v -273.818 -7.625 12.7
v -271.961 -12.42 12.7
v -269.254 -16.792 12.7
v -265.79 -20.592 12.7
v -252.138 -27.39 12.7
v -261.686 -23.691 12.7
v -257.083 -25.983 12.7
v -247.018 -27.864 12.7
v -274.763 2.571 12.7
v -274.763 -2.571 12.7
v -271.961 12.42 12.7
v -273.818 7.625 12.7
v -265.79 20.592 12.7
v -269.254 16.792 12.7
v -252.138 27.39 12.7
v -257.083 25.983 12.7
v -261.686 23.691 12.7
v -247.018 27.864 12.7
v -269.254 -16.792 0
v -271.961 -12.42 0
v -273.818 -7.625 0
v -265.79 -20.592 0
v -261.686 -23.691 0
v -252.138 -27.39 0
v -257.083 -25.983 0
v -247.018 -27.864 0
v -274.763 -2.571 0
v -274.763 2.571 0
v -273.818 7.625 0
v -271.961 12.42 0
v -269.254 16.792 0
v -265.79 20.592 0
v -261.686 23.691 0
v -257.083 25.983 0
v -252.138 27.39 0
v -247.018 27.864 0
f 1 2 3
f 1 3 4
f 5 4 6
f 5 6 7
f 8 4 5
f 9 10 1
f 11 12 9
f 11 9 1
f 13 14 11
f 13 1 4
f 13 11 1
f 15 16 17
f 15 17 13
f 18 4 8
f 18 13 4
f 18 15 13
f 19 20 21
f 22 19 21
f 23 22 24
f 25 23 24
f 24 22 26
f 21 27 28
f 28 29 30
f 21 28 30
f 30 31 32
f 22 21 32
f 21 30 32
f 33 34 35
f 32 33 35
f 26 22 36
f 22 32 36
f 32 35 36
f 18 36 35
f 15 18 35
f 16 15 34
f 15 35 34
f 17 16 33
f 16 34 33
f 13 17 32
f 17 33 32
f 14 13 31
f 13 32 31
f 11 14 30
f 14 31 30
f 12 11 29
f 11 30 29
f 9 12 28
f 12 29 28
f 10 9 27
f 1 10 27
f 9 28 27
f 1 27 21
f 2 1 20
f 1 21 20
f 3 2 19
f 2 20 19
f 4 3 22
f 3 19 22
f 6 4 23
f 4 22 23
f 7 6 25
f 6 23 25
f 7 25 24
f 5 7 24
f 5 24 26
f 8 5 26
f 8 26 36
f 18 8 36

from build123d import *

# Parameters (mm, degrees)
F4_DEPTH = 12.7
F5_R     = 6.1731972722
F6_DEPTH = 12.7
F7_DEPTH = 12.7


# Not quite as in the source:
# - a feature of the source that left no trace in its solid (it failed there, or was rolled back) is left out


with BuildPart() as f4:
    # F3 (on Top) → F4 (new body)
    with BuildSketch(Plane.XY):
        with BuildLine():
            Line((-247.0177412033, 0), (-247.0177412033, 27.8642479823))
            ThreePointArc((-247.0177412033, 27.8642479823), (-274.8819891856, 0), (-247.0177412033, -27.8642479823))
            Line((-247.0177412033, -27.8642479823), (-247.0177412033, 0))
        make_face()
    extrude(amount=F4_DEPTH)

    # F5 (on face) → F6 (join)
    with BuildSketch(Plane.XY.offset(12.7)):
        with Locations((-258.7949037552, 0)):
            Circle(F5_R)
    extrude(amount=-F6_DEPTH)

    # F5 (on face) → F7 (join)
    with BuildSketch(Plane.XY.offset(12.7)):
        with Locations((-258.7949037552, 0)):
            Circle(F5_R)
    extrude(amount=-F7_DEPTH)


solid = f4.part
